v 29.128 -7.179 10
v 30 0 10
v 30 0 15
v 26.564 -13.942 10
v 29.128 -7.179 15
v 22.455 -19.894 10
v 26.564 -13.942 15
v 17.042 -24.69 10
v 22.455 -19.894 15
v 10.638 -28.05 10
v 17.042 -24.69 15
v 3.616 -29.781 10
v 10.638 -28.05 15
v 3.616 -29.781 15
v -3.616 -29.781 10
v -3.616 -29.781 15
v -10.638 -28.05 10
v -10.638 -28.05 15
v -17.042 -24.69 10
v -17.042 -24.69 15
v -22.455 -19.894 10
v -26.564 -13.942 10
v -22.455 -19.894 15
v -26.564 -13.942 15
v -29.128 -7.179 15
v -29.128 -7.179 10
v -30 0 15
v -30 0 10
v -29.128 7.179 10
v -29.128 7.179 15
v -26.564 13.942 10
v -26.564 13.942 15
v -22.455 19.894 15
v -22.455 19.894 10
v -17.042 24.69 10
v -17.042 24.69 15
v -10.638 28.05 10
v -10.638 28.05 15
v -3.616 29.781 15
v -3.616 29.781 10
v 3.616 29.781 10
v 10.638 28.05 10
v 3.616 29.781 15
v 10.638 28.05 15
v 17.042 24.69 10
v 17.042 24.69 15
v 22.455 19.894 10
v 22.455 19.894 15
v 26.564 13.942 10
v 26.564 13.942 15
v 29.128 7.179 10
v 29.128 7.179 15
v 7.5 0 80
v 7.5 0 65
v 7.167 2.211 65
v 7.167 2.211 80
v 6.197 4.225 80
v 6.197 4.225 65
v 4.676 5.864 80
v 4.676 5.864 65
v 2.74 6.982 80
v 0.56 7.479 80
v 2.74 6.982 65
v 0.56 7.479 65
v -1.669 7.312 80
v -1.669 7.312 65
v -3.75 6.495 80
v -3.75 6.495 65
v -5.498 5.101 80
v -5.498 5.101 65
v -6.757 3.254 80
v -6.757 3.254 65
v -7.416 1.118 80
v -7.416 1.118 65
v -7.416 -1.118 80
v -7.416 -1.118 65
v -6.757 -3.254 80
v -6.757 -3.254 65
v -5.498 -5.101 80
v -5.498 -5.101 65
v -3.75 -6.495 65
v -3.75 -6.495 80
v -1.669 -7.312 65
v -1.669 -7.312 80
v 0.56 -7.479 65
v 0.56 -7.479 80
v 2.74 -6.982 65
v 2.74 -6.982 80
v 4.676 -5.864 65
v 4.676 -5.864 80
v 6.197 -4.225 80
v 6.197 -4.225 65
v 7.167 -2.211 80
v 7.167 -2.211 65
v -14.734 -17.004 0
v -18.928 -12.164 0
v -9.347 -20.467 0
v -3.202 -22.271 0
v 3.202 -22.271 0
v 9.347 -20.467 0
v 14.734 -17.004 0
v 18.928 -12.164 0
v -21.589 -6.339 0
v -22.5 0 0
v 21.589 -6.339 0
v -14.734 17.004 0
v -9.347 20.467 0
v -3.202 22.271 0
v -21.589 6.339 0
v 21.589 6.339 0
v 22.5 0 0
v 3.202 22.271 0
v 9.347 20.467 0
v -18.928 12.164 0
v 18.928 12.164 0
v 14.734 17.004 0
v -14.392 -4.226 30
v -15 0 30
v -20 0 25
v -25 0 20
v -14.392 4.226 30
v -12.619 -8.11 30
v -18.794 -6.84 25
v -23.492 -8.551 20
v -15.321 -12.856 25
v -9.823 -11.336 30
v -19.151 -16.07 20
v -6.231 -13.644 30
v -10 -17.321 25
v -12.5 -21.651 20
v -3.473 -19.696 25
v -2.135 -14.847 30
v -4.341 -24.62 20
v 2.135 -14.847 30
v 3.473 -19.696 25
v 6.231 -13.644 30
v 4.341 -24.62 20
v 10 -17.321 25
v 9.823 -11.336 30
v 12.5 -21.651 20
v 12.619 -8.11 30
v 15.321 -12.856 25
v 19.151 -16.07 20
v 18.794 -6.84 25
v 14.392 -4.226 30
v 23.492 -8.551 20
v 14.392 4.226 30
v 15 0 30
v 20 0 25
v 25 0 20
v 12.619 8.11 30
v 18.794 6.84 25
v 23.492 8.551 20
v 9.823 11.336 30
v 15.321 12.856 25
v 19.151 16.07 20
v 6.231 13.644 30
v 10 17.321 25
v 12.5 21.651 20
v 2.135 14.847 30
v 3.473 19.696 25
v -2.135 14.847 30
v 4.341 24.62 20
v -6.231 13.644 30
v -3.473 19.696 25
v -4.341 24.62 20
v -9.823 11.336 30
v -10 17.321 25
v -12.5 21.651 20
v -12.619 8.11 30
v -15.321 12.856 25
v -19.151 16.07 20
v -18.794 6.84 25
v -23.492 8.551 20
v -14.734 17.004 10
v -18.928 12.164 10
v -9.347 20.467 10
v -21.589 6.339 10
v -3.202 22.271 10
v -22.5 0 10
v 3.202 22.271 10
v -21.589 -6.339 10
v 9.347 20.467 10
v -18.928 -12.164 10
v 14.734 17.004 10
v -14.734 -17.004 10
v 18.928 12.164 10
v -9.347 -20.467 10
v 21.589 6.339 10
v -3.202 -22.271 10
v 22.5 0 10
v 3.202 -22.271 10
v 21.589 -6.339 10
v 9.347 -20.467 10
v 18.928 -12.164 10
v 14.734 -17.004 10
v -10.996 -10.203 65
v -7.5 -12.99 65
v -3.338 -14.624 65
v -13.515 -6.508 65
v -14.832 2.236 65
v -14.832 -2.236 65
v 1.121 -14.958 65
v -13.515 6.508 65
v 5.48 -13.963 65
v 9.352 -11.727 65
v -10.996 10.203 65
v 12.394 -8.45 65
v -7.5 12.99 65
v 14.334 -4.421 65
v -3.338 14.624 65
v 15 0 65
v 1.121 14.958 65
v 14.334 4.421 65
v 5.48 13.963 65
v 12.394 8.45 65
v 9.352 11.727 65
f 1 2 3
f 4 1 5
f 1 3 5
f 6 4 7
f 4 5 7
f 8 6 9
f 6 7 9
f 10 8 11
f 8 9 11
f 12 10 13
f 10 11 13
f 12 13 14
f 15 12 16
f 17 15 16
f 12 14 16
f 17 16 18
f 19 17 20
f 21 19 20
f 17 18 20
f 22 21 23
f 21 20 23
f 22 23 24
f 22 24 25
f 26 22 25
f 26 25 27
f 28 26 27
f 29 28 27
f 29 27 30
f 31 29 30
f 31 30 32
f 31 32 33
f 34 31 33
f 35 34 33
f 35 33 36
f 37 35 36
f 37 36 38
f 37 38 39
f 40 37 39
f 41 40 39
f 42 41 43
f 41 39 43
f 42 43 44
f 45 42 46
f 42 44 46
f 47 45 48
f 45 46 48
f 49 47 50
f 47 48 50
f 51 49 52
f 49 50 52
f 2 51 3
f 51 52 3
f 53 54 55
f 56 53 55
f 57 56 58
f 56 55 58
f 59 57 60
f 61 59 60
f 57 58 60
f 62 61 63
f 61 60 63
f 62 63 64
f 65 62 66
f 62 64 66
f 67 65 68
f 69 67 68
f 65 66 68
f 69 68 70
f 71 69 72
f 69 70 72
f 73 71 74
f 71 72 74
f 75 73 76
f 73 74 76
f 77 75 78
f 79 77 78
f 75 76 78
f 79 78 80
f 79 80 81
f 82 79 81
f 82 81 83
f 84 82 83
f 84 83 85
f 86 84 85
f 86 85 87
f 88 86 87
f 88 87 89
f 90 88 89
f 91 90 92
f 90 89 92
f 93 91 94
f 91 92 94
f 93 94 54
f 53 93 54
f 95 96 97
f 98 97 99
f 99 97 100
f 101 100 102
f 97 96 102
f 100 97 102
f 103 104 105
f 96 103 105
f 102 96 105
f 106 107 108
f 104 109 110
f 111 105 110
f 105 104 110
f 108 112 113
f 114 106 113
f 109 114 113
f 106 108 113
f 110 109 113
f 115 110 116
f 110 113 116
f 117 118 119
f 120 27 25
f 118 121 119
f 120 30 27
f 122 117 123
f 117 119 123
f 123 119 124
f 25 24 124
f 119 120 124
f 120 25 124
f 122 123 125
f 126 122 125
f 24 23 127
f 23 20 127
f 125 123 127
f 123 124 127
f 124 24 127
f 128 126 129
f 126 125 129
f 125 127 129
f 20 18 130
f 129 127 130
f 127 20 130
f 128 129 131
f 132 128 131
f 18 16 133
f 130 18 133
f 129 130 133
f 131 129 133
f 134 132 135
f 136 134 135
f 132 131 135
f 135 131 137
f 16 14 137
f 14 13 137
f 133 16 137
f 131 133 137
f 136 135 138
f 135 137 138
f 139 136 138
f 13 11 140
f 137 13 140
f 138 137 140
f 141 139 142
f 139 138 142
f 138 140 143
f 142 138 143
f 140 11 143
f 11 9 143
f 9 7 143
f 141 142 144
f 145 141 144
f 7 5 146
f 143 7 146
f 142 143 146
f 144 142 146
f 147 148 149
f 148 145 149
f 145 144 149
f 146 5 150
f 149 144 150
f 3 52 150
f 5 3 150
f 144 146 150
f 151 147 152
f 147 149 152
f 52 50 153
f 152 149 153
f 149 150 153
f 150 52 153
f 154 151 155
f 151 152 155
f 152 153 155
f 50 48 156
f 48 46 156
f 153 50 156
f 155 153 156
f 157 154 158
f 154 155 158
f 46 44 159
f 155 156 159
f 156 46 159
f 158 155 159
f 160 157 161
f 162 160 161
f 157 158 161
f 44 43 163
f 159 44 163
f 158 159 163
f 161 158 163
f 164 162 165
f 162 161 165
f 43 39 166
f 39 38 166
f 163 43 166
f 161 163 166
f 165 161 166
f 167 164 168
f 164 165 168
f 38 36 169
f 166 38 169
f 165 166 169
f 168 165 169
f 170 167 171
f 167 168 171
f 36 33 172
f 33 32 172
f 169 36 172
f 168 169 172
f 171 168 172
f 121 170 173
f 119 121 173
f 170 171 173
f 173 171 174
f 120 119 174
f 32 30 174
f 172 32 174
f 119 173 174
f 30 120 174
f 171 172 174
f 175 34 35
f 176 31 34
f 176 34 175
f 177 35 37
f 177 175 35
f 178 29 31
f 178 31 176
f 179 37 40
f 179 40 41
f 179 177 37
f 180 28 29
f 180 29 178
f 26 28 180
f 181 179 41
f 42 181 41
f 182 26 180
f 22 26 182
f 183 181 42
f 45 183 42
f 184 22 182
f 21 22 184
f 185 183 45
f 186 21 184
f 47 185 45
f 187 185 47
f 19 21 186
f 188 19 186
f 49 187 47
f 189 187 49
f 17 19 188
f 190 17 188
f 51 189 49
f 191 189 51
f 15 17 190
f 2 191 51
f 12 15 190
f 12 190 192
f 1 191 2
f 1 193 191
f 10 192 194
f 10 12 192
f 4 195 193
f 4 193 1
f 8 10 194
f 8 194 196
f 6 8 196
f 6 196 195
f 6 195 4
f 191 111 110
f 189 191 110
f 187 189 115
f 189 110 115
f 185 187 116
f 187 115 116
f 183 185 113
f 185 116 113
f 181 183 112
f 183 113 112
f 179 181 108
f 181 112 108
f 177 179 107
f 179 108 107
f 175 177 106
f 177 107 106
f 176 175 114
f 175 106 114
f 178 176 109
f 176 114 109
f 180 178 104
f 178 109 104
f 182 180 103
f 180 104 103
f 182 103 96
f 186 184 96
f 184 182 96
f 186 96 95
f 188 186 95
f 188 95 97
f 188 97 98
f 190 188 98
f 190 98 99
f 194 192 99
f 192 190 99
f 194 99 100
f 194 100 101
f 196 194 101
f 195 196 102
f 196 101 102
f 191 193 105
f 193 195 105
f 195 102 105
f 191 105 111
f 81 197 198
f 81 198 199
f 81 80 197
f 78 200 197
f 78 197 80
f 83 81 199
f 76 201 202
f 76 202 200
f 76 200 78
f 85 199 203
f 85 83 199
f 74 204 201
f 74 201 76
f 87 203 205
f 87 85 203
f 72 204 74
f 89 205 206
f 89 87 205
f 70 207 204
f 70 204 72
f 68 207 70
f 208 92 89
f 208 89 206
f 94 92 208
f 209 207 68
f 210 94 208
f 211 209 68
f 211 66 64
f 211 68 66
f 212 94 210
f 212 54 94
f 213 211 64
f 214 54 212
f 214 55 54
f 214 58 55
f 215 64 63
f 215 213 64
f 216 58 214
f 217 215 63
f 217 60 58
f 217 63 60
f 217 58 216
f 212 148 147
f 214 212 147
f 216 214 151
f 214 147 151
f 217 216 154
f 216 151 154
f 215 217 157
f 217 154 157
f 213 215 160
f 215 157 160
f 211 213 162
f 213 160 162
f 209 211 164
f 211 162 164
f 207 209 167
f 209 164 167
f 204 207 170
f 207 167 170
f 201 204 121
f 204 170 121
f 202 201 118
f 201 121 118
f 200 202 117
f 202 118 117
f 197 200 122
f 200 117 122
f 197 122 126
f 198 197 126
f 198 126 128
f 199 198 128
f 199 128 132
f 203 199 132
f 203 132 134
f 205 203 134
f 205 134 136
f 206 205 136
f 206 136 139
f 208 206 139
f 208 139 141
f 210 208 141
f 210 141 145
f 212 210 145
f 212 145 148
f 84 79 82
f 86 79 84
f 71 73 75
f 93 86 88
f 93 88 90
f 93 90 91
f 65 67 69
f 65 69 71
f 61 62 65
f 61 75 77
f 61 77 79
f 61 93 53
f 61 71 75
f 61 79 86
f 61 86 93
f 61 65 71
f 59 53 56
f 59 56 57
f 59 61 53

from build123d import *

# Parameters (mm, degrees)
F0_R     = 22.5
F1_DEPTH = 15
F4_R     = 30
F5_DEPTH = 5
F6_R     = 15
F7_DEPTH = 35
F8_R     = 7.5
F9_DEPTH = 15


with BuildPart() as f1:
    # F0 (on Top) → F1 (new body)
    with BuildSketch(Plane.XY):
        Circle(F0_R)
    extrude(amount=F1_DEPTH)

    # F2 (on Front) → F3 (revolve)
    with BuildSketch(Plane.XZ):
        Polygon((-30, 15), (0, 15), (0, 30), (-15, 30), align=None)
    revolve(axis=Axis((0, 0, 7.5), (0, 0, 1)))

    # F4 (on face) → F5 (join)
    with BuildSketch(Plane(origin=(0, 0, 15), x_dir=(1, 0, 0), z_dir=(0, 0, -1))):
        Circle(F4_R)
    extrude(amount=F5_DEPTH)

    # F6 (on face) → F7 (join)
    with BuildSketch(Plane.XY.offset(30)):
        Circle(F6_R)
    extrude(amount=F7_DEPTH)

    # F8 (on face) → F9 (join)
    with BuildSketch(Plane.XY.offset(65)):
        Circle(F8_R)
    extrude(amount=F9_DEPTH)


solid = f1.part
